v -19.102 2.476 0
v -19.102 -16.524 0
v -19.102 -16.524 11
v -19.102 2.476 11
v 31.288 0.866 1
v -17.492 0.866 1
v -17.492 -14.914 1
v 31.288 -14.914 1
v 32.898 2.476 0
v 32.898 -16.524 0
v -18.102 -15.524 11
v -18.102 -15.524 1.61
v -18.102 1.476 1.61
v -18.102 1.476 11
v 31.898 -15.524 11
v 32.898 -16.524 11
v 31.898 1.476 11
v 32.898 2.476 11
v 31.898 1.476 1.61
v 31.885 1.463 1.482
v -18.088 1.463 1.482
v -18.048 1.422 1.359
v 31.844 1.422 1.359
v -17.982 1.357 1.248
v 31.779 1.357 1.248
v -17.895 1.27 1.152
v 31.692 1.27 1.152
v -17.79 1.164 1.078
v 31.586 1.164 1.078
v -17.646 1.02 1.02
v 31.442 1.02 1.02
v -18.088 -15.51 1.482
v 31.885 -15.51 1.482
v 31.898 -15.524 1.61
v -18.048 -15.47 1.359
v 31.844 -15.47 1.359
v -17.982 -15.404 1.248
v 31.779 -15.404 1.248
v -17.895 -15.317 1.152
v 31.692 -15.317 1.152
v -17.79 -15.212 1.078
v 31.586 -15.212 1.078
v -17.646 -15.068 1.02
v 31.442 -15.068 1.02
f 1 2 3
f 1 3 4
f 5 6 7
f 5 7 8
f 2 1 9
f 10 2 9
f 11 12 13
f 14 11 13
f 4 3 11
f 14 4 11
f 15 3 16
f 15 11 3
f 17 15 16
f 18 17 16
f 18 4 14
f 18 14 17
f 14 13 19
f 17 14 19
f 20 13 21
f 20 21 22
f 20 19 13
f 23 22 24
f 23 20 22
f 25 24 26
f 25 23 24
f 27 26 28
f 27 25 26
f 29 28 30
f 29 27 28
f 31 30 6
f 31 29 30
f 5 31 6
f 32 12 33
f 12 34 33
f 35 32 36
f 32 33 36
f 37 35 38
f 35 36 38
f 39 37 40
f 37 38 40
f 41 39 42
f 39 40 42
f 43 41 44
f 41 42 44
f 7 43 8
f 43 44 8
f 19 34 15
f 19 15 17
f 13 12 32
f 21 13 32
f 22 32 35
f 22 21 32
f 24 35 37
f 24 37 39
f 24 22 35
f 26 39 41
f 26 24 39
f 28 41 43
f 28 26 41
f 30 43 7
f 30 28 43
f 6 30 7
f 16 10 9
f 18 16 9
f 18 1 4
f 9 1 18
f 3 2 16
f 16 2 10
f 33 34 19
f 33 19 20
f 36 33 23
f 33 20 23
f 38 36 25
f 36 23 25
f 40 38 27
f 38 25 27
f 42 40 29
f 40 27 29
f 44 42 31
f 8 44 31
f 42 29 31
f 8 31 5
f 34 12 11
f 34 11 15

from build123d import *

# Parameters (mm, degrees)
F0_W     = 50
F0_H     = 17
F1_DEPTH = 1
F0_W_2   = 52
F0_H_2   = 19
F2_DEPTH = 11
F3_R     = 0.61


with BuildPart() as f1:
    # F0 (on Top) → F1 (new body)
    with BuildSketch(Plane.XY):
        with Locations((6.898358, -7.023614)):
            Rectangle(F0_W, F0_H)
    extrude(amount=F1_DEPTH)

    # F0 (on Top) → F2 (join)
    with BuildSketch(Plane.XY):
        with Locations((6.898358, -7.023614)):
            Rectangle(F0_W_2, F0_H_2)
        with Locations((6.898358, -7.023614)):
            Rectangle(F0_W, F0_H, mode=Mode.SUBTRACT)
    extrude(amount=F2_DEPTH)

    # F3
    f3_edges = [f1.edges().sort_by_distance(p)[0] for p in [
        (6.898358, 1.476386, 1),
        (-18.101642, -7.023614, 1),
        (6.898358, -15.523614, 1),
        (31.898358, -7.023614, 1),
    ]]
    fillet(f3_edges, radius=F3_R)


solid = f1.part
